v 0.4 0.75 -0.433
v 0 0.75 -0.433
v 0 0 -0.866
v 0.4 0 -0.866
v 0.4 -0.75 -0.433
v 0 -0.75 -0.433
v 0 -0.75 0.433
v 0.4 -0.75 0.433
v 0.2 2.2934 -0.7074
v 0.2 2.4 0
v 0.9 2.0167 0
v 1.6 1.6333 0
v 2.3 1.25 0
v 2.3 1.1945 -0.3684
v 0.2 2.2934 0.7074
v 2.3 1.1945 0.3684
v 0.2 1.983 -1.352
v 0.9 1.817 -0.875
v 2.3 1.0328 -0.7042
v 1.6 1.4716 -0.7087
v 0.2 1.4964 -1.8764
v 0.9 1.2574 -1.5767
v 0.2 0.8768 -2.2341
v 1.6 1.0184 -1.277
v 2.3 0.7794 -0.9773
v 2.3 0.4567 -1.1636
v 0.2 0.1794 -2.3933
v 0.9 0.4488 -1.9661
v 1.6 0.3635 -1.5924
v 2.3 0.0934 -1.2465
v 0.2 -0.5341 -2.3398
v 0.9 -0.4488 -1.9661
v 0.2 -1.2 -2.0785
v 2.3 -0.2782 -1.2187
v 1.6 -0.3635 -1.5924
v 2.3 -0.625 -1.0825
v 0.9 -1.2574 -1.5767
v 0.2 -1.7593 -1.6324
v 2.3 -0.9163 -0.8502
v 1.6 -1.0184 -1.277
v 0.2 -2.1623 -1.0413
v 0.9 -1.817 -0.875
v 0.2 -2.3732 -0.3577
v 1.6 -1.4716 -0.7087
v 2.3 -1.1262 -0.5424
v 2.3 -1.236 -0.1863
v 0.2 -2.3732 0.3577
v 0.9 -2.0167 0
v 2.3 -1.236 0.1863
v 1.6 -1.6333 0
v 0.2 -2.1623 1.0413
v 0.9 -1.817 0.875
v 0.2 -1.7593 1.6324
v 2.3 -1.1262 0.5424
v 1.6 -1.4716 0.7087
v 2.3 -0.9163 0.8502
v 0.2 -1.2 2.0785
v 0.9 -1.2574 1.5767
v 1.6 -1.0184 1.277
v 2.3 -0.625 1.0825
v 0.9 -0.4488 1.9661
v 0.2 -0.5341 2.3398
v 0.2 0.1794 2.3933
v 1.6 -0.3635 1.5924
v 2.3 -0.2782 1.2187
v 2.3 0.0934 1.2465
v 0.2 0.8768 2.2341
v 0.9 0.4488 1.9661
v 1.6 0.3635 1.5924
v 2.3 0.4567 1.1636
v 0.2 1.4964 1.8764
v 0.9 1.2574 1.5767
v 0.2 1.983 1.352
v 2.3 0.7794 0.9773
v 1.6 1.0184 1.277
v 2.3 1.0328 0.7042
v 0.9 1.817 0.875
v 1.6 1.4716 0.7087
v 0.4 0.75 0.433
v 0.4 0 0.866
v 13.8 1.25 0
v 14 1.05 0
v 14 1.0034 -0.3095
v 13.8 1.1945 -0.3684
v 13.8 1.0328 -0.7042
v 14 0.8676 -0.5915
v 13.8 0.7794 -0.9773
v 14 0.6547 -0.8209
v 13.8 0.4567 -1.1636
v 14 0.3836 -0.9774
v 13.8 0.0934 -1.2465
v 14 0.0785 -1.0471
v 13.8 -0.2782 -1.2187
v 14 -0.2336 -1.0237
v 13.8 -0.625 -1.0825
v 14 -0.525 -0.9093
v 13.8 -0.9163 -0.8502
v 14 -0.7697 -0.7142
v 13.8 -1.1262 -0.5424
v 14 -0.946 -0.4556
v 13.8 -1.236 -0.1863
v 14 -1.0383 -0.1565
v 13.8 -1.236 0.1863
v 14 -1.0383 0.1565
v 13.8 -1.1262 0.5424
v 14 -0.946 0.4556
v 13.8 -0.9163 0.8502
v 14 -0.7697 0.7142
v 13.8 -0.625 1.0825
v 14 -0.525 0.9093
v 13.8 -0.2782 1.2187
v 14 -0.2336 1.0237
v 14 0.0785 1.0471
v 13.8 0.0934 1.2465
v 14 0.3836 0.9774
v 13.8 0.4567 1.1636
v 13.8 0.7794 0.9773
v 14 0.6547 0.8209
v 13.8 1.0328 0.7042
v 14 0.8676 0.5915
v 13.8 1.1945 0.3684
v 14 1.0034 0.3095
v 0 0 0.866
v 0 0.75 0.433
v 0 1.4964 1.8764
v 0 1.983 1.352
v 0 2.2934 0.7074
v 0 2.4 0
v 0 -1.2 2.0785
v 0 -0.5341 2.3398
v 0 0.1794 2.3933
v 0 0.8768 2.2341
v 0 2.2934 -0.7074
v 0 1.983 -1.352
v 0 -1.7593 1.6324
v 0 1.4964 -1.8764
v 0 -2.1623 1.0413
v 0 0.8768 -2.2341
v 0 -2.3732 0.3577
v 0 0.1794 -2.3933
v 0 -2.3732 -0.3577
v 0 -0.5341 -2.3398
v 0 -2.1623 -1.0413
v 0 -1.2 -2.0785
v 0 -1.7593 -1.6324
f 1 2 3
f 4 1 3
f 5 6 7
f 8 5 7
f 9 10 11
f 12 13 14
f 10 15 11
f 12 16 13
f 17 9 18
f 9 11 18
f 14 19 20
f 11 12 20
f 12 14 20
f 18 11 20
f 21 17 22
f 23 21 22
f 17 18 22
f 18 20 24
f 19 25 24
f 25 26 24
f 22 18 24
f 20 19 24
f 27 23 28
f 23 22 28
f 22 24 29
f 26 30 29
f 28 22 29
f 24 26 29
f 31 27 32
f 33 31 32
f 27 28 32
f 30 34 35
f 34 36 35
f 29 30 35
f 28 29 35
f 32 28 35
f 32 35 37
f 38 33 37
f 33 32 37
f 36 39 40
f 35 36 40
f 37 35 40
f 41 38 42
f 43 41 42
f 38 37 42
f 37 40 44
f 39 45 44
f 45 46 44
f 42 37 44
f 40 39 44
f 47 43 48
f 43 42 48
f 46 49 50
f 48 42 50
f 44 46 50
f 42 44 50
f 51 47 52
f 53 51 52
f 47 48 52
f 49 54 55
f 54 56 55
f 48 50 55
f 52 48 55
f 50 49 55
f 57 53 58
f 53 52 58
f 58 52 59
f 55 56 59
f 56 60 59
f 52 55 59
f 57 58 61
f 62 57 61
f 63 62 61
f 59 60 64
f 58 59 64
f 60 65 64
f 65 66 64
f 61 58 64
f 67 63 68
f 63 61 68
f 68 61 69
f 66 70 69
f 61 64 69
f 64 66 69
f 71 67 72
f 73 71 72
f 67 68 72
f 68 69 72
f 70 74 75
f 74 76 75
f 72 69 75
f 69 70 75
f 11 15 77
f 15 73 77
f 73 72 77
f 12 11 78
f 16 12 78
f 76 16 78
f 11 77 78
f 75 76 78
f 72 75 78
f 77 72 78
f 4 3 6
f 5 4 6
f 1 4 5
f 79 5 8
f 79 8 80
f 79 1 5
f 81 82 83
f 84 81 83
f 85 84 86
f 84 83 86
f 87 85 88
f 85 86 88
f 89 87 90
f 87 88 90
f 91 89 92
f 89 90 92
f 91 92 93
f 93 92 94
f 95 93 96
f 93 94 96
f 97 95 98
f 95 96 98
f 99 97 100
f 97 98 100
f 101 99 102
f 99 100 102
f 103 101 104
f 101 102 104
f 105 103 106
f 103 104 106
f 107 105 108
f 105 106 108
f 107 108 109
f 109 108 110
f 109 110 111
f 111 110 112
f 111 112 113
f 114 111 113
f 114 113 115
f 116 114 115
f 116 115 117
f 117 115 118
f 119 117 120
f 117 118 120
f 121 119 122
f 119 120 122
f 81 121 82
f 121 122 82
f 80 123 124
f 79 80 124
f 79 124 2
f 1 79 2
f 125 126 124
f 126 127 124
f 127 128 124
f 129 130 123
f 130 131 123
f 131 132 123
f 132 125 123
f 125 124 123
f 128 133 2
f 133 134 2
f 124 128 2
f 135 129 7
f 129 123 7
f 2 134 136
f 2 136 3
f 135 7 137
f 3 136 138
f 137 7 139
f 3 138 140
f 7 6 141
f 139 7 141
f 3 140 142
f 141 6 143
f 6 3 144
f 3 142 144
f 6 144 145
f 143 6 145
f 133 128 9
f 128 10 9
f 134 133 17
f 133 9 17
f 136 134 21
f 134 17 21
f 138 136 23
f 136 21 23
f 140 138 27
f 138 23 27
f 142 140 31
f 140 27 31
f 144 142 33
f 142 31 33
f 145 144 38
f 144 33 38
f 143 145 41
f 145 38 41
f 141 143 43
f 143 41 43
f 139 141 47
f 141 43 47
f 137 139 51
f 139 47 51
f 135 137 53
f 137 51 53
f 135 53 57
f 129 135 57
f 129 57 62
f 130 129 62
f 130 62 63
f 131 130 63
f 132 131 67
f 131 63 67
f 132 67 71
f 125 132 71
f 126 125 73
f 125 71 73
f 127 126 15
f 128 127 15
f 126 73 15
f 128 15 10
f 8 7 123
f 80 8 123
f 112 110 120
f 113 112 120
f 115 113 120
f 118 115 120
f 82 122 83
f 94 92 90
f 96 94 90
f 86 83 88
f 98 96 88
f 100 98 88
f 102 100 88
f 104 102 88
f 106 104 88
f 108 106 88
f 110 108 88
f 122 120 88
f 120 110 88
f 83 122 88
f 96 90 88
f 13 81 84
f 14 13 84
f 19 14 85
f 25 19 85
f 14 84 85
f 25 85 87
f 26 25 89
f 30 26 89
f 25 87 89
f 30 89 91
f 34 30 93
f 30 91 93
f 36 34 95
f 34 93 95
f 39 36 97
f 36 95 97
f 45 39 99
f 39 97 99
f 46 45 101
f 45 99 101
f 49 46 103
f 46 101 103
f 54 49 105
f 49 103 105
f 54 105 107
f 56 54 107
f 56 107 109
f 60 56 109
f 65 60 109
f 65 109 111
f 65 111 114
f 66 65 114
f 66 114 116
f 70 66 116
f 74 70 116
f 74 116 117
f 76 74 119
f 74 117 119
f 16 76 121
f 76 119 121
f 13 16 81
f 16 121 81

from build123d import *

# Parameters (mm, degrees)
CUT_EXTRUDE_1_DEPTH = 0.4
CHAMFER_1_SIZE      = 0.2


with BuildPart() as part:
    # 草图1 → 旋转1 (revolve)
    with BuildSketch(Plane.XY, mode=Mode.PRIVATE) as revolve_1_sk:
        Polygon((0, 0), (0, -2.4), (0.2, -2.4), (2.3, -1.25), (14, -1.25), (14, 0), align=None)
    revolve(revolve_1_sk.sketch.rotate(Axis((14, 0, 0), (-1, 0, 0)), 180), axis=Axis((14, 0, 0), (-1, 0, 0)))

    # 草图2 → 切除-拉伸1 (cut)
    with BuildSketch(Plane.ZY):
        Polygon((0.866025404, 0), (0.433012702, 0.75), (-0.433012702, 0.75), (-0.866025404, 0), (-0.433012702, -0.75), (0.433012702, -0.75), align=None)
    extrude(amount=-CUT_EXTRUDE_1_DEPTH, mode=Mode.SUBTRACT)

    # 倒角1
    chamfer_1_edges = [part.edges().sort_by_distance(p)[0] for p in [
        (14, -1.25, 0),
    ]]
    chamfer(chamfer_1_edges, length=CHAMFER_1_SIZE)


solid = part.part
